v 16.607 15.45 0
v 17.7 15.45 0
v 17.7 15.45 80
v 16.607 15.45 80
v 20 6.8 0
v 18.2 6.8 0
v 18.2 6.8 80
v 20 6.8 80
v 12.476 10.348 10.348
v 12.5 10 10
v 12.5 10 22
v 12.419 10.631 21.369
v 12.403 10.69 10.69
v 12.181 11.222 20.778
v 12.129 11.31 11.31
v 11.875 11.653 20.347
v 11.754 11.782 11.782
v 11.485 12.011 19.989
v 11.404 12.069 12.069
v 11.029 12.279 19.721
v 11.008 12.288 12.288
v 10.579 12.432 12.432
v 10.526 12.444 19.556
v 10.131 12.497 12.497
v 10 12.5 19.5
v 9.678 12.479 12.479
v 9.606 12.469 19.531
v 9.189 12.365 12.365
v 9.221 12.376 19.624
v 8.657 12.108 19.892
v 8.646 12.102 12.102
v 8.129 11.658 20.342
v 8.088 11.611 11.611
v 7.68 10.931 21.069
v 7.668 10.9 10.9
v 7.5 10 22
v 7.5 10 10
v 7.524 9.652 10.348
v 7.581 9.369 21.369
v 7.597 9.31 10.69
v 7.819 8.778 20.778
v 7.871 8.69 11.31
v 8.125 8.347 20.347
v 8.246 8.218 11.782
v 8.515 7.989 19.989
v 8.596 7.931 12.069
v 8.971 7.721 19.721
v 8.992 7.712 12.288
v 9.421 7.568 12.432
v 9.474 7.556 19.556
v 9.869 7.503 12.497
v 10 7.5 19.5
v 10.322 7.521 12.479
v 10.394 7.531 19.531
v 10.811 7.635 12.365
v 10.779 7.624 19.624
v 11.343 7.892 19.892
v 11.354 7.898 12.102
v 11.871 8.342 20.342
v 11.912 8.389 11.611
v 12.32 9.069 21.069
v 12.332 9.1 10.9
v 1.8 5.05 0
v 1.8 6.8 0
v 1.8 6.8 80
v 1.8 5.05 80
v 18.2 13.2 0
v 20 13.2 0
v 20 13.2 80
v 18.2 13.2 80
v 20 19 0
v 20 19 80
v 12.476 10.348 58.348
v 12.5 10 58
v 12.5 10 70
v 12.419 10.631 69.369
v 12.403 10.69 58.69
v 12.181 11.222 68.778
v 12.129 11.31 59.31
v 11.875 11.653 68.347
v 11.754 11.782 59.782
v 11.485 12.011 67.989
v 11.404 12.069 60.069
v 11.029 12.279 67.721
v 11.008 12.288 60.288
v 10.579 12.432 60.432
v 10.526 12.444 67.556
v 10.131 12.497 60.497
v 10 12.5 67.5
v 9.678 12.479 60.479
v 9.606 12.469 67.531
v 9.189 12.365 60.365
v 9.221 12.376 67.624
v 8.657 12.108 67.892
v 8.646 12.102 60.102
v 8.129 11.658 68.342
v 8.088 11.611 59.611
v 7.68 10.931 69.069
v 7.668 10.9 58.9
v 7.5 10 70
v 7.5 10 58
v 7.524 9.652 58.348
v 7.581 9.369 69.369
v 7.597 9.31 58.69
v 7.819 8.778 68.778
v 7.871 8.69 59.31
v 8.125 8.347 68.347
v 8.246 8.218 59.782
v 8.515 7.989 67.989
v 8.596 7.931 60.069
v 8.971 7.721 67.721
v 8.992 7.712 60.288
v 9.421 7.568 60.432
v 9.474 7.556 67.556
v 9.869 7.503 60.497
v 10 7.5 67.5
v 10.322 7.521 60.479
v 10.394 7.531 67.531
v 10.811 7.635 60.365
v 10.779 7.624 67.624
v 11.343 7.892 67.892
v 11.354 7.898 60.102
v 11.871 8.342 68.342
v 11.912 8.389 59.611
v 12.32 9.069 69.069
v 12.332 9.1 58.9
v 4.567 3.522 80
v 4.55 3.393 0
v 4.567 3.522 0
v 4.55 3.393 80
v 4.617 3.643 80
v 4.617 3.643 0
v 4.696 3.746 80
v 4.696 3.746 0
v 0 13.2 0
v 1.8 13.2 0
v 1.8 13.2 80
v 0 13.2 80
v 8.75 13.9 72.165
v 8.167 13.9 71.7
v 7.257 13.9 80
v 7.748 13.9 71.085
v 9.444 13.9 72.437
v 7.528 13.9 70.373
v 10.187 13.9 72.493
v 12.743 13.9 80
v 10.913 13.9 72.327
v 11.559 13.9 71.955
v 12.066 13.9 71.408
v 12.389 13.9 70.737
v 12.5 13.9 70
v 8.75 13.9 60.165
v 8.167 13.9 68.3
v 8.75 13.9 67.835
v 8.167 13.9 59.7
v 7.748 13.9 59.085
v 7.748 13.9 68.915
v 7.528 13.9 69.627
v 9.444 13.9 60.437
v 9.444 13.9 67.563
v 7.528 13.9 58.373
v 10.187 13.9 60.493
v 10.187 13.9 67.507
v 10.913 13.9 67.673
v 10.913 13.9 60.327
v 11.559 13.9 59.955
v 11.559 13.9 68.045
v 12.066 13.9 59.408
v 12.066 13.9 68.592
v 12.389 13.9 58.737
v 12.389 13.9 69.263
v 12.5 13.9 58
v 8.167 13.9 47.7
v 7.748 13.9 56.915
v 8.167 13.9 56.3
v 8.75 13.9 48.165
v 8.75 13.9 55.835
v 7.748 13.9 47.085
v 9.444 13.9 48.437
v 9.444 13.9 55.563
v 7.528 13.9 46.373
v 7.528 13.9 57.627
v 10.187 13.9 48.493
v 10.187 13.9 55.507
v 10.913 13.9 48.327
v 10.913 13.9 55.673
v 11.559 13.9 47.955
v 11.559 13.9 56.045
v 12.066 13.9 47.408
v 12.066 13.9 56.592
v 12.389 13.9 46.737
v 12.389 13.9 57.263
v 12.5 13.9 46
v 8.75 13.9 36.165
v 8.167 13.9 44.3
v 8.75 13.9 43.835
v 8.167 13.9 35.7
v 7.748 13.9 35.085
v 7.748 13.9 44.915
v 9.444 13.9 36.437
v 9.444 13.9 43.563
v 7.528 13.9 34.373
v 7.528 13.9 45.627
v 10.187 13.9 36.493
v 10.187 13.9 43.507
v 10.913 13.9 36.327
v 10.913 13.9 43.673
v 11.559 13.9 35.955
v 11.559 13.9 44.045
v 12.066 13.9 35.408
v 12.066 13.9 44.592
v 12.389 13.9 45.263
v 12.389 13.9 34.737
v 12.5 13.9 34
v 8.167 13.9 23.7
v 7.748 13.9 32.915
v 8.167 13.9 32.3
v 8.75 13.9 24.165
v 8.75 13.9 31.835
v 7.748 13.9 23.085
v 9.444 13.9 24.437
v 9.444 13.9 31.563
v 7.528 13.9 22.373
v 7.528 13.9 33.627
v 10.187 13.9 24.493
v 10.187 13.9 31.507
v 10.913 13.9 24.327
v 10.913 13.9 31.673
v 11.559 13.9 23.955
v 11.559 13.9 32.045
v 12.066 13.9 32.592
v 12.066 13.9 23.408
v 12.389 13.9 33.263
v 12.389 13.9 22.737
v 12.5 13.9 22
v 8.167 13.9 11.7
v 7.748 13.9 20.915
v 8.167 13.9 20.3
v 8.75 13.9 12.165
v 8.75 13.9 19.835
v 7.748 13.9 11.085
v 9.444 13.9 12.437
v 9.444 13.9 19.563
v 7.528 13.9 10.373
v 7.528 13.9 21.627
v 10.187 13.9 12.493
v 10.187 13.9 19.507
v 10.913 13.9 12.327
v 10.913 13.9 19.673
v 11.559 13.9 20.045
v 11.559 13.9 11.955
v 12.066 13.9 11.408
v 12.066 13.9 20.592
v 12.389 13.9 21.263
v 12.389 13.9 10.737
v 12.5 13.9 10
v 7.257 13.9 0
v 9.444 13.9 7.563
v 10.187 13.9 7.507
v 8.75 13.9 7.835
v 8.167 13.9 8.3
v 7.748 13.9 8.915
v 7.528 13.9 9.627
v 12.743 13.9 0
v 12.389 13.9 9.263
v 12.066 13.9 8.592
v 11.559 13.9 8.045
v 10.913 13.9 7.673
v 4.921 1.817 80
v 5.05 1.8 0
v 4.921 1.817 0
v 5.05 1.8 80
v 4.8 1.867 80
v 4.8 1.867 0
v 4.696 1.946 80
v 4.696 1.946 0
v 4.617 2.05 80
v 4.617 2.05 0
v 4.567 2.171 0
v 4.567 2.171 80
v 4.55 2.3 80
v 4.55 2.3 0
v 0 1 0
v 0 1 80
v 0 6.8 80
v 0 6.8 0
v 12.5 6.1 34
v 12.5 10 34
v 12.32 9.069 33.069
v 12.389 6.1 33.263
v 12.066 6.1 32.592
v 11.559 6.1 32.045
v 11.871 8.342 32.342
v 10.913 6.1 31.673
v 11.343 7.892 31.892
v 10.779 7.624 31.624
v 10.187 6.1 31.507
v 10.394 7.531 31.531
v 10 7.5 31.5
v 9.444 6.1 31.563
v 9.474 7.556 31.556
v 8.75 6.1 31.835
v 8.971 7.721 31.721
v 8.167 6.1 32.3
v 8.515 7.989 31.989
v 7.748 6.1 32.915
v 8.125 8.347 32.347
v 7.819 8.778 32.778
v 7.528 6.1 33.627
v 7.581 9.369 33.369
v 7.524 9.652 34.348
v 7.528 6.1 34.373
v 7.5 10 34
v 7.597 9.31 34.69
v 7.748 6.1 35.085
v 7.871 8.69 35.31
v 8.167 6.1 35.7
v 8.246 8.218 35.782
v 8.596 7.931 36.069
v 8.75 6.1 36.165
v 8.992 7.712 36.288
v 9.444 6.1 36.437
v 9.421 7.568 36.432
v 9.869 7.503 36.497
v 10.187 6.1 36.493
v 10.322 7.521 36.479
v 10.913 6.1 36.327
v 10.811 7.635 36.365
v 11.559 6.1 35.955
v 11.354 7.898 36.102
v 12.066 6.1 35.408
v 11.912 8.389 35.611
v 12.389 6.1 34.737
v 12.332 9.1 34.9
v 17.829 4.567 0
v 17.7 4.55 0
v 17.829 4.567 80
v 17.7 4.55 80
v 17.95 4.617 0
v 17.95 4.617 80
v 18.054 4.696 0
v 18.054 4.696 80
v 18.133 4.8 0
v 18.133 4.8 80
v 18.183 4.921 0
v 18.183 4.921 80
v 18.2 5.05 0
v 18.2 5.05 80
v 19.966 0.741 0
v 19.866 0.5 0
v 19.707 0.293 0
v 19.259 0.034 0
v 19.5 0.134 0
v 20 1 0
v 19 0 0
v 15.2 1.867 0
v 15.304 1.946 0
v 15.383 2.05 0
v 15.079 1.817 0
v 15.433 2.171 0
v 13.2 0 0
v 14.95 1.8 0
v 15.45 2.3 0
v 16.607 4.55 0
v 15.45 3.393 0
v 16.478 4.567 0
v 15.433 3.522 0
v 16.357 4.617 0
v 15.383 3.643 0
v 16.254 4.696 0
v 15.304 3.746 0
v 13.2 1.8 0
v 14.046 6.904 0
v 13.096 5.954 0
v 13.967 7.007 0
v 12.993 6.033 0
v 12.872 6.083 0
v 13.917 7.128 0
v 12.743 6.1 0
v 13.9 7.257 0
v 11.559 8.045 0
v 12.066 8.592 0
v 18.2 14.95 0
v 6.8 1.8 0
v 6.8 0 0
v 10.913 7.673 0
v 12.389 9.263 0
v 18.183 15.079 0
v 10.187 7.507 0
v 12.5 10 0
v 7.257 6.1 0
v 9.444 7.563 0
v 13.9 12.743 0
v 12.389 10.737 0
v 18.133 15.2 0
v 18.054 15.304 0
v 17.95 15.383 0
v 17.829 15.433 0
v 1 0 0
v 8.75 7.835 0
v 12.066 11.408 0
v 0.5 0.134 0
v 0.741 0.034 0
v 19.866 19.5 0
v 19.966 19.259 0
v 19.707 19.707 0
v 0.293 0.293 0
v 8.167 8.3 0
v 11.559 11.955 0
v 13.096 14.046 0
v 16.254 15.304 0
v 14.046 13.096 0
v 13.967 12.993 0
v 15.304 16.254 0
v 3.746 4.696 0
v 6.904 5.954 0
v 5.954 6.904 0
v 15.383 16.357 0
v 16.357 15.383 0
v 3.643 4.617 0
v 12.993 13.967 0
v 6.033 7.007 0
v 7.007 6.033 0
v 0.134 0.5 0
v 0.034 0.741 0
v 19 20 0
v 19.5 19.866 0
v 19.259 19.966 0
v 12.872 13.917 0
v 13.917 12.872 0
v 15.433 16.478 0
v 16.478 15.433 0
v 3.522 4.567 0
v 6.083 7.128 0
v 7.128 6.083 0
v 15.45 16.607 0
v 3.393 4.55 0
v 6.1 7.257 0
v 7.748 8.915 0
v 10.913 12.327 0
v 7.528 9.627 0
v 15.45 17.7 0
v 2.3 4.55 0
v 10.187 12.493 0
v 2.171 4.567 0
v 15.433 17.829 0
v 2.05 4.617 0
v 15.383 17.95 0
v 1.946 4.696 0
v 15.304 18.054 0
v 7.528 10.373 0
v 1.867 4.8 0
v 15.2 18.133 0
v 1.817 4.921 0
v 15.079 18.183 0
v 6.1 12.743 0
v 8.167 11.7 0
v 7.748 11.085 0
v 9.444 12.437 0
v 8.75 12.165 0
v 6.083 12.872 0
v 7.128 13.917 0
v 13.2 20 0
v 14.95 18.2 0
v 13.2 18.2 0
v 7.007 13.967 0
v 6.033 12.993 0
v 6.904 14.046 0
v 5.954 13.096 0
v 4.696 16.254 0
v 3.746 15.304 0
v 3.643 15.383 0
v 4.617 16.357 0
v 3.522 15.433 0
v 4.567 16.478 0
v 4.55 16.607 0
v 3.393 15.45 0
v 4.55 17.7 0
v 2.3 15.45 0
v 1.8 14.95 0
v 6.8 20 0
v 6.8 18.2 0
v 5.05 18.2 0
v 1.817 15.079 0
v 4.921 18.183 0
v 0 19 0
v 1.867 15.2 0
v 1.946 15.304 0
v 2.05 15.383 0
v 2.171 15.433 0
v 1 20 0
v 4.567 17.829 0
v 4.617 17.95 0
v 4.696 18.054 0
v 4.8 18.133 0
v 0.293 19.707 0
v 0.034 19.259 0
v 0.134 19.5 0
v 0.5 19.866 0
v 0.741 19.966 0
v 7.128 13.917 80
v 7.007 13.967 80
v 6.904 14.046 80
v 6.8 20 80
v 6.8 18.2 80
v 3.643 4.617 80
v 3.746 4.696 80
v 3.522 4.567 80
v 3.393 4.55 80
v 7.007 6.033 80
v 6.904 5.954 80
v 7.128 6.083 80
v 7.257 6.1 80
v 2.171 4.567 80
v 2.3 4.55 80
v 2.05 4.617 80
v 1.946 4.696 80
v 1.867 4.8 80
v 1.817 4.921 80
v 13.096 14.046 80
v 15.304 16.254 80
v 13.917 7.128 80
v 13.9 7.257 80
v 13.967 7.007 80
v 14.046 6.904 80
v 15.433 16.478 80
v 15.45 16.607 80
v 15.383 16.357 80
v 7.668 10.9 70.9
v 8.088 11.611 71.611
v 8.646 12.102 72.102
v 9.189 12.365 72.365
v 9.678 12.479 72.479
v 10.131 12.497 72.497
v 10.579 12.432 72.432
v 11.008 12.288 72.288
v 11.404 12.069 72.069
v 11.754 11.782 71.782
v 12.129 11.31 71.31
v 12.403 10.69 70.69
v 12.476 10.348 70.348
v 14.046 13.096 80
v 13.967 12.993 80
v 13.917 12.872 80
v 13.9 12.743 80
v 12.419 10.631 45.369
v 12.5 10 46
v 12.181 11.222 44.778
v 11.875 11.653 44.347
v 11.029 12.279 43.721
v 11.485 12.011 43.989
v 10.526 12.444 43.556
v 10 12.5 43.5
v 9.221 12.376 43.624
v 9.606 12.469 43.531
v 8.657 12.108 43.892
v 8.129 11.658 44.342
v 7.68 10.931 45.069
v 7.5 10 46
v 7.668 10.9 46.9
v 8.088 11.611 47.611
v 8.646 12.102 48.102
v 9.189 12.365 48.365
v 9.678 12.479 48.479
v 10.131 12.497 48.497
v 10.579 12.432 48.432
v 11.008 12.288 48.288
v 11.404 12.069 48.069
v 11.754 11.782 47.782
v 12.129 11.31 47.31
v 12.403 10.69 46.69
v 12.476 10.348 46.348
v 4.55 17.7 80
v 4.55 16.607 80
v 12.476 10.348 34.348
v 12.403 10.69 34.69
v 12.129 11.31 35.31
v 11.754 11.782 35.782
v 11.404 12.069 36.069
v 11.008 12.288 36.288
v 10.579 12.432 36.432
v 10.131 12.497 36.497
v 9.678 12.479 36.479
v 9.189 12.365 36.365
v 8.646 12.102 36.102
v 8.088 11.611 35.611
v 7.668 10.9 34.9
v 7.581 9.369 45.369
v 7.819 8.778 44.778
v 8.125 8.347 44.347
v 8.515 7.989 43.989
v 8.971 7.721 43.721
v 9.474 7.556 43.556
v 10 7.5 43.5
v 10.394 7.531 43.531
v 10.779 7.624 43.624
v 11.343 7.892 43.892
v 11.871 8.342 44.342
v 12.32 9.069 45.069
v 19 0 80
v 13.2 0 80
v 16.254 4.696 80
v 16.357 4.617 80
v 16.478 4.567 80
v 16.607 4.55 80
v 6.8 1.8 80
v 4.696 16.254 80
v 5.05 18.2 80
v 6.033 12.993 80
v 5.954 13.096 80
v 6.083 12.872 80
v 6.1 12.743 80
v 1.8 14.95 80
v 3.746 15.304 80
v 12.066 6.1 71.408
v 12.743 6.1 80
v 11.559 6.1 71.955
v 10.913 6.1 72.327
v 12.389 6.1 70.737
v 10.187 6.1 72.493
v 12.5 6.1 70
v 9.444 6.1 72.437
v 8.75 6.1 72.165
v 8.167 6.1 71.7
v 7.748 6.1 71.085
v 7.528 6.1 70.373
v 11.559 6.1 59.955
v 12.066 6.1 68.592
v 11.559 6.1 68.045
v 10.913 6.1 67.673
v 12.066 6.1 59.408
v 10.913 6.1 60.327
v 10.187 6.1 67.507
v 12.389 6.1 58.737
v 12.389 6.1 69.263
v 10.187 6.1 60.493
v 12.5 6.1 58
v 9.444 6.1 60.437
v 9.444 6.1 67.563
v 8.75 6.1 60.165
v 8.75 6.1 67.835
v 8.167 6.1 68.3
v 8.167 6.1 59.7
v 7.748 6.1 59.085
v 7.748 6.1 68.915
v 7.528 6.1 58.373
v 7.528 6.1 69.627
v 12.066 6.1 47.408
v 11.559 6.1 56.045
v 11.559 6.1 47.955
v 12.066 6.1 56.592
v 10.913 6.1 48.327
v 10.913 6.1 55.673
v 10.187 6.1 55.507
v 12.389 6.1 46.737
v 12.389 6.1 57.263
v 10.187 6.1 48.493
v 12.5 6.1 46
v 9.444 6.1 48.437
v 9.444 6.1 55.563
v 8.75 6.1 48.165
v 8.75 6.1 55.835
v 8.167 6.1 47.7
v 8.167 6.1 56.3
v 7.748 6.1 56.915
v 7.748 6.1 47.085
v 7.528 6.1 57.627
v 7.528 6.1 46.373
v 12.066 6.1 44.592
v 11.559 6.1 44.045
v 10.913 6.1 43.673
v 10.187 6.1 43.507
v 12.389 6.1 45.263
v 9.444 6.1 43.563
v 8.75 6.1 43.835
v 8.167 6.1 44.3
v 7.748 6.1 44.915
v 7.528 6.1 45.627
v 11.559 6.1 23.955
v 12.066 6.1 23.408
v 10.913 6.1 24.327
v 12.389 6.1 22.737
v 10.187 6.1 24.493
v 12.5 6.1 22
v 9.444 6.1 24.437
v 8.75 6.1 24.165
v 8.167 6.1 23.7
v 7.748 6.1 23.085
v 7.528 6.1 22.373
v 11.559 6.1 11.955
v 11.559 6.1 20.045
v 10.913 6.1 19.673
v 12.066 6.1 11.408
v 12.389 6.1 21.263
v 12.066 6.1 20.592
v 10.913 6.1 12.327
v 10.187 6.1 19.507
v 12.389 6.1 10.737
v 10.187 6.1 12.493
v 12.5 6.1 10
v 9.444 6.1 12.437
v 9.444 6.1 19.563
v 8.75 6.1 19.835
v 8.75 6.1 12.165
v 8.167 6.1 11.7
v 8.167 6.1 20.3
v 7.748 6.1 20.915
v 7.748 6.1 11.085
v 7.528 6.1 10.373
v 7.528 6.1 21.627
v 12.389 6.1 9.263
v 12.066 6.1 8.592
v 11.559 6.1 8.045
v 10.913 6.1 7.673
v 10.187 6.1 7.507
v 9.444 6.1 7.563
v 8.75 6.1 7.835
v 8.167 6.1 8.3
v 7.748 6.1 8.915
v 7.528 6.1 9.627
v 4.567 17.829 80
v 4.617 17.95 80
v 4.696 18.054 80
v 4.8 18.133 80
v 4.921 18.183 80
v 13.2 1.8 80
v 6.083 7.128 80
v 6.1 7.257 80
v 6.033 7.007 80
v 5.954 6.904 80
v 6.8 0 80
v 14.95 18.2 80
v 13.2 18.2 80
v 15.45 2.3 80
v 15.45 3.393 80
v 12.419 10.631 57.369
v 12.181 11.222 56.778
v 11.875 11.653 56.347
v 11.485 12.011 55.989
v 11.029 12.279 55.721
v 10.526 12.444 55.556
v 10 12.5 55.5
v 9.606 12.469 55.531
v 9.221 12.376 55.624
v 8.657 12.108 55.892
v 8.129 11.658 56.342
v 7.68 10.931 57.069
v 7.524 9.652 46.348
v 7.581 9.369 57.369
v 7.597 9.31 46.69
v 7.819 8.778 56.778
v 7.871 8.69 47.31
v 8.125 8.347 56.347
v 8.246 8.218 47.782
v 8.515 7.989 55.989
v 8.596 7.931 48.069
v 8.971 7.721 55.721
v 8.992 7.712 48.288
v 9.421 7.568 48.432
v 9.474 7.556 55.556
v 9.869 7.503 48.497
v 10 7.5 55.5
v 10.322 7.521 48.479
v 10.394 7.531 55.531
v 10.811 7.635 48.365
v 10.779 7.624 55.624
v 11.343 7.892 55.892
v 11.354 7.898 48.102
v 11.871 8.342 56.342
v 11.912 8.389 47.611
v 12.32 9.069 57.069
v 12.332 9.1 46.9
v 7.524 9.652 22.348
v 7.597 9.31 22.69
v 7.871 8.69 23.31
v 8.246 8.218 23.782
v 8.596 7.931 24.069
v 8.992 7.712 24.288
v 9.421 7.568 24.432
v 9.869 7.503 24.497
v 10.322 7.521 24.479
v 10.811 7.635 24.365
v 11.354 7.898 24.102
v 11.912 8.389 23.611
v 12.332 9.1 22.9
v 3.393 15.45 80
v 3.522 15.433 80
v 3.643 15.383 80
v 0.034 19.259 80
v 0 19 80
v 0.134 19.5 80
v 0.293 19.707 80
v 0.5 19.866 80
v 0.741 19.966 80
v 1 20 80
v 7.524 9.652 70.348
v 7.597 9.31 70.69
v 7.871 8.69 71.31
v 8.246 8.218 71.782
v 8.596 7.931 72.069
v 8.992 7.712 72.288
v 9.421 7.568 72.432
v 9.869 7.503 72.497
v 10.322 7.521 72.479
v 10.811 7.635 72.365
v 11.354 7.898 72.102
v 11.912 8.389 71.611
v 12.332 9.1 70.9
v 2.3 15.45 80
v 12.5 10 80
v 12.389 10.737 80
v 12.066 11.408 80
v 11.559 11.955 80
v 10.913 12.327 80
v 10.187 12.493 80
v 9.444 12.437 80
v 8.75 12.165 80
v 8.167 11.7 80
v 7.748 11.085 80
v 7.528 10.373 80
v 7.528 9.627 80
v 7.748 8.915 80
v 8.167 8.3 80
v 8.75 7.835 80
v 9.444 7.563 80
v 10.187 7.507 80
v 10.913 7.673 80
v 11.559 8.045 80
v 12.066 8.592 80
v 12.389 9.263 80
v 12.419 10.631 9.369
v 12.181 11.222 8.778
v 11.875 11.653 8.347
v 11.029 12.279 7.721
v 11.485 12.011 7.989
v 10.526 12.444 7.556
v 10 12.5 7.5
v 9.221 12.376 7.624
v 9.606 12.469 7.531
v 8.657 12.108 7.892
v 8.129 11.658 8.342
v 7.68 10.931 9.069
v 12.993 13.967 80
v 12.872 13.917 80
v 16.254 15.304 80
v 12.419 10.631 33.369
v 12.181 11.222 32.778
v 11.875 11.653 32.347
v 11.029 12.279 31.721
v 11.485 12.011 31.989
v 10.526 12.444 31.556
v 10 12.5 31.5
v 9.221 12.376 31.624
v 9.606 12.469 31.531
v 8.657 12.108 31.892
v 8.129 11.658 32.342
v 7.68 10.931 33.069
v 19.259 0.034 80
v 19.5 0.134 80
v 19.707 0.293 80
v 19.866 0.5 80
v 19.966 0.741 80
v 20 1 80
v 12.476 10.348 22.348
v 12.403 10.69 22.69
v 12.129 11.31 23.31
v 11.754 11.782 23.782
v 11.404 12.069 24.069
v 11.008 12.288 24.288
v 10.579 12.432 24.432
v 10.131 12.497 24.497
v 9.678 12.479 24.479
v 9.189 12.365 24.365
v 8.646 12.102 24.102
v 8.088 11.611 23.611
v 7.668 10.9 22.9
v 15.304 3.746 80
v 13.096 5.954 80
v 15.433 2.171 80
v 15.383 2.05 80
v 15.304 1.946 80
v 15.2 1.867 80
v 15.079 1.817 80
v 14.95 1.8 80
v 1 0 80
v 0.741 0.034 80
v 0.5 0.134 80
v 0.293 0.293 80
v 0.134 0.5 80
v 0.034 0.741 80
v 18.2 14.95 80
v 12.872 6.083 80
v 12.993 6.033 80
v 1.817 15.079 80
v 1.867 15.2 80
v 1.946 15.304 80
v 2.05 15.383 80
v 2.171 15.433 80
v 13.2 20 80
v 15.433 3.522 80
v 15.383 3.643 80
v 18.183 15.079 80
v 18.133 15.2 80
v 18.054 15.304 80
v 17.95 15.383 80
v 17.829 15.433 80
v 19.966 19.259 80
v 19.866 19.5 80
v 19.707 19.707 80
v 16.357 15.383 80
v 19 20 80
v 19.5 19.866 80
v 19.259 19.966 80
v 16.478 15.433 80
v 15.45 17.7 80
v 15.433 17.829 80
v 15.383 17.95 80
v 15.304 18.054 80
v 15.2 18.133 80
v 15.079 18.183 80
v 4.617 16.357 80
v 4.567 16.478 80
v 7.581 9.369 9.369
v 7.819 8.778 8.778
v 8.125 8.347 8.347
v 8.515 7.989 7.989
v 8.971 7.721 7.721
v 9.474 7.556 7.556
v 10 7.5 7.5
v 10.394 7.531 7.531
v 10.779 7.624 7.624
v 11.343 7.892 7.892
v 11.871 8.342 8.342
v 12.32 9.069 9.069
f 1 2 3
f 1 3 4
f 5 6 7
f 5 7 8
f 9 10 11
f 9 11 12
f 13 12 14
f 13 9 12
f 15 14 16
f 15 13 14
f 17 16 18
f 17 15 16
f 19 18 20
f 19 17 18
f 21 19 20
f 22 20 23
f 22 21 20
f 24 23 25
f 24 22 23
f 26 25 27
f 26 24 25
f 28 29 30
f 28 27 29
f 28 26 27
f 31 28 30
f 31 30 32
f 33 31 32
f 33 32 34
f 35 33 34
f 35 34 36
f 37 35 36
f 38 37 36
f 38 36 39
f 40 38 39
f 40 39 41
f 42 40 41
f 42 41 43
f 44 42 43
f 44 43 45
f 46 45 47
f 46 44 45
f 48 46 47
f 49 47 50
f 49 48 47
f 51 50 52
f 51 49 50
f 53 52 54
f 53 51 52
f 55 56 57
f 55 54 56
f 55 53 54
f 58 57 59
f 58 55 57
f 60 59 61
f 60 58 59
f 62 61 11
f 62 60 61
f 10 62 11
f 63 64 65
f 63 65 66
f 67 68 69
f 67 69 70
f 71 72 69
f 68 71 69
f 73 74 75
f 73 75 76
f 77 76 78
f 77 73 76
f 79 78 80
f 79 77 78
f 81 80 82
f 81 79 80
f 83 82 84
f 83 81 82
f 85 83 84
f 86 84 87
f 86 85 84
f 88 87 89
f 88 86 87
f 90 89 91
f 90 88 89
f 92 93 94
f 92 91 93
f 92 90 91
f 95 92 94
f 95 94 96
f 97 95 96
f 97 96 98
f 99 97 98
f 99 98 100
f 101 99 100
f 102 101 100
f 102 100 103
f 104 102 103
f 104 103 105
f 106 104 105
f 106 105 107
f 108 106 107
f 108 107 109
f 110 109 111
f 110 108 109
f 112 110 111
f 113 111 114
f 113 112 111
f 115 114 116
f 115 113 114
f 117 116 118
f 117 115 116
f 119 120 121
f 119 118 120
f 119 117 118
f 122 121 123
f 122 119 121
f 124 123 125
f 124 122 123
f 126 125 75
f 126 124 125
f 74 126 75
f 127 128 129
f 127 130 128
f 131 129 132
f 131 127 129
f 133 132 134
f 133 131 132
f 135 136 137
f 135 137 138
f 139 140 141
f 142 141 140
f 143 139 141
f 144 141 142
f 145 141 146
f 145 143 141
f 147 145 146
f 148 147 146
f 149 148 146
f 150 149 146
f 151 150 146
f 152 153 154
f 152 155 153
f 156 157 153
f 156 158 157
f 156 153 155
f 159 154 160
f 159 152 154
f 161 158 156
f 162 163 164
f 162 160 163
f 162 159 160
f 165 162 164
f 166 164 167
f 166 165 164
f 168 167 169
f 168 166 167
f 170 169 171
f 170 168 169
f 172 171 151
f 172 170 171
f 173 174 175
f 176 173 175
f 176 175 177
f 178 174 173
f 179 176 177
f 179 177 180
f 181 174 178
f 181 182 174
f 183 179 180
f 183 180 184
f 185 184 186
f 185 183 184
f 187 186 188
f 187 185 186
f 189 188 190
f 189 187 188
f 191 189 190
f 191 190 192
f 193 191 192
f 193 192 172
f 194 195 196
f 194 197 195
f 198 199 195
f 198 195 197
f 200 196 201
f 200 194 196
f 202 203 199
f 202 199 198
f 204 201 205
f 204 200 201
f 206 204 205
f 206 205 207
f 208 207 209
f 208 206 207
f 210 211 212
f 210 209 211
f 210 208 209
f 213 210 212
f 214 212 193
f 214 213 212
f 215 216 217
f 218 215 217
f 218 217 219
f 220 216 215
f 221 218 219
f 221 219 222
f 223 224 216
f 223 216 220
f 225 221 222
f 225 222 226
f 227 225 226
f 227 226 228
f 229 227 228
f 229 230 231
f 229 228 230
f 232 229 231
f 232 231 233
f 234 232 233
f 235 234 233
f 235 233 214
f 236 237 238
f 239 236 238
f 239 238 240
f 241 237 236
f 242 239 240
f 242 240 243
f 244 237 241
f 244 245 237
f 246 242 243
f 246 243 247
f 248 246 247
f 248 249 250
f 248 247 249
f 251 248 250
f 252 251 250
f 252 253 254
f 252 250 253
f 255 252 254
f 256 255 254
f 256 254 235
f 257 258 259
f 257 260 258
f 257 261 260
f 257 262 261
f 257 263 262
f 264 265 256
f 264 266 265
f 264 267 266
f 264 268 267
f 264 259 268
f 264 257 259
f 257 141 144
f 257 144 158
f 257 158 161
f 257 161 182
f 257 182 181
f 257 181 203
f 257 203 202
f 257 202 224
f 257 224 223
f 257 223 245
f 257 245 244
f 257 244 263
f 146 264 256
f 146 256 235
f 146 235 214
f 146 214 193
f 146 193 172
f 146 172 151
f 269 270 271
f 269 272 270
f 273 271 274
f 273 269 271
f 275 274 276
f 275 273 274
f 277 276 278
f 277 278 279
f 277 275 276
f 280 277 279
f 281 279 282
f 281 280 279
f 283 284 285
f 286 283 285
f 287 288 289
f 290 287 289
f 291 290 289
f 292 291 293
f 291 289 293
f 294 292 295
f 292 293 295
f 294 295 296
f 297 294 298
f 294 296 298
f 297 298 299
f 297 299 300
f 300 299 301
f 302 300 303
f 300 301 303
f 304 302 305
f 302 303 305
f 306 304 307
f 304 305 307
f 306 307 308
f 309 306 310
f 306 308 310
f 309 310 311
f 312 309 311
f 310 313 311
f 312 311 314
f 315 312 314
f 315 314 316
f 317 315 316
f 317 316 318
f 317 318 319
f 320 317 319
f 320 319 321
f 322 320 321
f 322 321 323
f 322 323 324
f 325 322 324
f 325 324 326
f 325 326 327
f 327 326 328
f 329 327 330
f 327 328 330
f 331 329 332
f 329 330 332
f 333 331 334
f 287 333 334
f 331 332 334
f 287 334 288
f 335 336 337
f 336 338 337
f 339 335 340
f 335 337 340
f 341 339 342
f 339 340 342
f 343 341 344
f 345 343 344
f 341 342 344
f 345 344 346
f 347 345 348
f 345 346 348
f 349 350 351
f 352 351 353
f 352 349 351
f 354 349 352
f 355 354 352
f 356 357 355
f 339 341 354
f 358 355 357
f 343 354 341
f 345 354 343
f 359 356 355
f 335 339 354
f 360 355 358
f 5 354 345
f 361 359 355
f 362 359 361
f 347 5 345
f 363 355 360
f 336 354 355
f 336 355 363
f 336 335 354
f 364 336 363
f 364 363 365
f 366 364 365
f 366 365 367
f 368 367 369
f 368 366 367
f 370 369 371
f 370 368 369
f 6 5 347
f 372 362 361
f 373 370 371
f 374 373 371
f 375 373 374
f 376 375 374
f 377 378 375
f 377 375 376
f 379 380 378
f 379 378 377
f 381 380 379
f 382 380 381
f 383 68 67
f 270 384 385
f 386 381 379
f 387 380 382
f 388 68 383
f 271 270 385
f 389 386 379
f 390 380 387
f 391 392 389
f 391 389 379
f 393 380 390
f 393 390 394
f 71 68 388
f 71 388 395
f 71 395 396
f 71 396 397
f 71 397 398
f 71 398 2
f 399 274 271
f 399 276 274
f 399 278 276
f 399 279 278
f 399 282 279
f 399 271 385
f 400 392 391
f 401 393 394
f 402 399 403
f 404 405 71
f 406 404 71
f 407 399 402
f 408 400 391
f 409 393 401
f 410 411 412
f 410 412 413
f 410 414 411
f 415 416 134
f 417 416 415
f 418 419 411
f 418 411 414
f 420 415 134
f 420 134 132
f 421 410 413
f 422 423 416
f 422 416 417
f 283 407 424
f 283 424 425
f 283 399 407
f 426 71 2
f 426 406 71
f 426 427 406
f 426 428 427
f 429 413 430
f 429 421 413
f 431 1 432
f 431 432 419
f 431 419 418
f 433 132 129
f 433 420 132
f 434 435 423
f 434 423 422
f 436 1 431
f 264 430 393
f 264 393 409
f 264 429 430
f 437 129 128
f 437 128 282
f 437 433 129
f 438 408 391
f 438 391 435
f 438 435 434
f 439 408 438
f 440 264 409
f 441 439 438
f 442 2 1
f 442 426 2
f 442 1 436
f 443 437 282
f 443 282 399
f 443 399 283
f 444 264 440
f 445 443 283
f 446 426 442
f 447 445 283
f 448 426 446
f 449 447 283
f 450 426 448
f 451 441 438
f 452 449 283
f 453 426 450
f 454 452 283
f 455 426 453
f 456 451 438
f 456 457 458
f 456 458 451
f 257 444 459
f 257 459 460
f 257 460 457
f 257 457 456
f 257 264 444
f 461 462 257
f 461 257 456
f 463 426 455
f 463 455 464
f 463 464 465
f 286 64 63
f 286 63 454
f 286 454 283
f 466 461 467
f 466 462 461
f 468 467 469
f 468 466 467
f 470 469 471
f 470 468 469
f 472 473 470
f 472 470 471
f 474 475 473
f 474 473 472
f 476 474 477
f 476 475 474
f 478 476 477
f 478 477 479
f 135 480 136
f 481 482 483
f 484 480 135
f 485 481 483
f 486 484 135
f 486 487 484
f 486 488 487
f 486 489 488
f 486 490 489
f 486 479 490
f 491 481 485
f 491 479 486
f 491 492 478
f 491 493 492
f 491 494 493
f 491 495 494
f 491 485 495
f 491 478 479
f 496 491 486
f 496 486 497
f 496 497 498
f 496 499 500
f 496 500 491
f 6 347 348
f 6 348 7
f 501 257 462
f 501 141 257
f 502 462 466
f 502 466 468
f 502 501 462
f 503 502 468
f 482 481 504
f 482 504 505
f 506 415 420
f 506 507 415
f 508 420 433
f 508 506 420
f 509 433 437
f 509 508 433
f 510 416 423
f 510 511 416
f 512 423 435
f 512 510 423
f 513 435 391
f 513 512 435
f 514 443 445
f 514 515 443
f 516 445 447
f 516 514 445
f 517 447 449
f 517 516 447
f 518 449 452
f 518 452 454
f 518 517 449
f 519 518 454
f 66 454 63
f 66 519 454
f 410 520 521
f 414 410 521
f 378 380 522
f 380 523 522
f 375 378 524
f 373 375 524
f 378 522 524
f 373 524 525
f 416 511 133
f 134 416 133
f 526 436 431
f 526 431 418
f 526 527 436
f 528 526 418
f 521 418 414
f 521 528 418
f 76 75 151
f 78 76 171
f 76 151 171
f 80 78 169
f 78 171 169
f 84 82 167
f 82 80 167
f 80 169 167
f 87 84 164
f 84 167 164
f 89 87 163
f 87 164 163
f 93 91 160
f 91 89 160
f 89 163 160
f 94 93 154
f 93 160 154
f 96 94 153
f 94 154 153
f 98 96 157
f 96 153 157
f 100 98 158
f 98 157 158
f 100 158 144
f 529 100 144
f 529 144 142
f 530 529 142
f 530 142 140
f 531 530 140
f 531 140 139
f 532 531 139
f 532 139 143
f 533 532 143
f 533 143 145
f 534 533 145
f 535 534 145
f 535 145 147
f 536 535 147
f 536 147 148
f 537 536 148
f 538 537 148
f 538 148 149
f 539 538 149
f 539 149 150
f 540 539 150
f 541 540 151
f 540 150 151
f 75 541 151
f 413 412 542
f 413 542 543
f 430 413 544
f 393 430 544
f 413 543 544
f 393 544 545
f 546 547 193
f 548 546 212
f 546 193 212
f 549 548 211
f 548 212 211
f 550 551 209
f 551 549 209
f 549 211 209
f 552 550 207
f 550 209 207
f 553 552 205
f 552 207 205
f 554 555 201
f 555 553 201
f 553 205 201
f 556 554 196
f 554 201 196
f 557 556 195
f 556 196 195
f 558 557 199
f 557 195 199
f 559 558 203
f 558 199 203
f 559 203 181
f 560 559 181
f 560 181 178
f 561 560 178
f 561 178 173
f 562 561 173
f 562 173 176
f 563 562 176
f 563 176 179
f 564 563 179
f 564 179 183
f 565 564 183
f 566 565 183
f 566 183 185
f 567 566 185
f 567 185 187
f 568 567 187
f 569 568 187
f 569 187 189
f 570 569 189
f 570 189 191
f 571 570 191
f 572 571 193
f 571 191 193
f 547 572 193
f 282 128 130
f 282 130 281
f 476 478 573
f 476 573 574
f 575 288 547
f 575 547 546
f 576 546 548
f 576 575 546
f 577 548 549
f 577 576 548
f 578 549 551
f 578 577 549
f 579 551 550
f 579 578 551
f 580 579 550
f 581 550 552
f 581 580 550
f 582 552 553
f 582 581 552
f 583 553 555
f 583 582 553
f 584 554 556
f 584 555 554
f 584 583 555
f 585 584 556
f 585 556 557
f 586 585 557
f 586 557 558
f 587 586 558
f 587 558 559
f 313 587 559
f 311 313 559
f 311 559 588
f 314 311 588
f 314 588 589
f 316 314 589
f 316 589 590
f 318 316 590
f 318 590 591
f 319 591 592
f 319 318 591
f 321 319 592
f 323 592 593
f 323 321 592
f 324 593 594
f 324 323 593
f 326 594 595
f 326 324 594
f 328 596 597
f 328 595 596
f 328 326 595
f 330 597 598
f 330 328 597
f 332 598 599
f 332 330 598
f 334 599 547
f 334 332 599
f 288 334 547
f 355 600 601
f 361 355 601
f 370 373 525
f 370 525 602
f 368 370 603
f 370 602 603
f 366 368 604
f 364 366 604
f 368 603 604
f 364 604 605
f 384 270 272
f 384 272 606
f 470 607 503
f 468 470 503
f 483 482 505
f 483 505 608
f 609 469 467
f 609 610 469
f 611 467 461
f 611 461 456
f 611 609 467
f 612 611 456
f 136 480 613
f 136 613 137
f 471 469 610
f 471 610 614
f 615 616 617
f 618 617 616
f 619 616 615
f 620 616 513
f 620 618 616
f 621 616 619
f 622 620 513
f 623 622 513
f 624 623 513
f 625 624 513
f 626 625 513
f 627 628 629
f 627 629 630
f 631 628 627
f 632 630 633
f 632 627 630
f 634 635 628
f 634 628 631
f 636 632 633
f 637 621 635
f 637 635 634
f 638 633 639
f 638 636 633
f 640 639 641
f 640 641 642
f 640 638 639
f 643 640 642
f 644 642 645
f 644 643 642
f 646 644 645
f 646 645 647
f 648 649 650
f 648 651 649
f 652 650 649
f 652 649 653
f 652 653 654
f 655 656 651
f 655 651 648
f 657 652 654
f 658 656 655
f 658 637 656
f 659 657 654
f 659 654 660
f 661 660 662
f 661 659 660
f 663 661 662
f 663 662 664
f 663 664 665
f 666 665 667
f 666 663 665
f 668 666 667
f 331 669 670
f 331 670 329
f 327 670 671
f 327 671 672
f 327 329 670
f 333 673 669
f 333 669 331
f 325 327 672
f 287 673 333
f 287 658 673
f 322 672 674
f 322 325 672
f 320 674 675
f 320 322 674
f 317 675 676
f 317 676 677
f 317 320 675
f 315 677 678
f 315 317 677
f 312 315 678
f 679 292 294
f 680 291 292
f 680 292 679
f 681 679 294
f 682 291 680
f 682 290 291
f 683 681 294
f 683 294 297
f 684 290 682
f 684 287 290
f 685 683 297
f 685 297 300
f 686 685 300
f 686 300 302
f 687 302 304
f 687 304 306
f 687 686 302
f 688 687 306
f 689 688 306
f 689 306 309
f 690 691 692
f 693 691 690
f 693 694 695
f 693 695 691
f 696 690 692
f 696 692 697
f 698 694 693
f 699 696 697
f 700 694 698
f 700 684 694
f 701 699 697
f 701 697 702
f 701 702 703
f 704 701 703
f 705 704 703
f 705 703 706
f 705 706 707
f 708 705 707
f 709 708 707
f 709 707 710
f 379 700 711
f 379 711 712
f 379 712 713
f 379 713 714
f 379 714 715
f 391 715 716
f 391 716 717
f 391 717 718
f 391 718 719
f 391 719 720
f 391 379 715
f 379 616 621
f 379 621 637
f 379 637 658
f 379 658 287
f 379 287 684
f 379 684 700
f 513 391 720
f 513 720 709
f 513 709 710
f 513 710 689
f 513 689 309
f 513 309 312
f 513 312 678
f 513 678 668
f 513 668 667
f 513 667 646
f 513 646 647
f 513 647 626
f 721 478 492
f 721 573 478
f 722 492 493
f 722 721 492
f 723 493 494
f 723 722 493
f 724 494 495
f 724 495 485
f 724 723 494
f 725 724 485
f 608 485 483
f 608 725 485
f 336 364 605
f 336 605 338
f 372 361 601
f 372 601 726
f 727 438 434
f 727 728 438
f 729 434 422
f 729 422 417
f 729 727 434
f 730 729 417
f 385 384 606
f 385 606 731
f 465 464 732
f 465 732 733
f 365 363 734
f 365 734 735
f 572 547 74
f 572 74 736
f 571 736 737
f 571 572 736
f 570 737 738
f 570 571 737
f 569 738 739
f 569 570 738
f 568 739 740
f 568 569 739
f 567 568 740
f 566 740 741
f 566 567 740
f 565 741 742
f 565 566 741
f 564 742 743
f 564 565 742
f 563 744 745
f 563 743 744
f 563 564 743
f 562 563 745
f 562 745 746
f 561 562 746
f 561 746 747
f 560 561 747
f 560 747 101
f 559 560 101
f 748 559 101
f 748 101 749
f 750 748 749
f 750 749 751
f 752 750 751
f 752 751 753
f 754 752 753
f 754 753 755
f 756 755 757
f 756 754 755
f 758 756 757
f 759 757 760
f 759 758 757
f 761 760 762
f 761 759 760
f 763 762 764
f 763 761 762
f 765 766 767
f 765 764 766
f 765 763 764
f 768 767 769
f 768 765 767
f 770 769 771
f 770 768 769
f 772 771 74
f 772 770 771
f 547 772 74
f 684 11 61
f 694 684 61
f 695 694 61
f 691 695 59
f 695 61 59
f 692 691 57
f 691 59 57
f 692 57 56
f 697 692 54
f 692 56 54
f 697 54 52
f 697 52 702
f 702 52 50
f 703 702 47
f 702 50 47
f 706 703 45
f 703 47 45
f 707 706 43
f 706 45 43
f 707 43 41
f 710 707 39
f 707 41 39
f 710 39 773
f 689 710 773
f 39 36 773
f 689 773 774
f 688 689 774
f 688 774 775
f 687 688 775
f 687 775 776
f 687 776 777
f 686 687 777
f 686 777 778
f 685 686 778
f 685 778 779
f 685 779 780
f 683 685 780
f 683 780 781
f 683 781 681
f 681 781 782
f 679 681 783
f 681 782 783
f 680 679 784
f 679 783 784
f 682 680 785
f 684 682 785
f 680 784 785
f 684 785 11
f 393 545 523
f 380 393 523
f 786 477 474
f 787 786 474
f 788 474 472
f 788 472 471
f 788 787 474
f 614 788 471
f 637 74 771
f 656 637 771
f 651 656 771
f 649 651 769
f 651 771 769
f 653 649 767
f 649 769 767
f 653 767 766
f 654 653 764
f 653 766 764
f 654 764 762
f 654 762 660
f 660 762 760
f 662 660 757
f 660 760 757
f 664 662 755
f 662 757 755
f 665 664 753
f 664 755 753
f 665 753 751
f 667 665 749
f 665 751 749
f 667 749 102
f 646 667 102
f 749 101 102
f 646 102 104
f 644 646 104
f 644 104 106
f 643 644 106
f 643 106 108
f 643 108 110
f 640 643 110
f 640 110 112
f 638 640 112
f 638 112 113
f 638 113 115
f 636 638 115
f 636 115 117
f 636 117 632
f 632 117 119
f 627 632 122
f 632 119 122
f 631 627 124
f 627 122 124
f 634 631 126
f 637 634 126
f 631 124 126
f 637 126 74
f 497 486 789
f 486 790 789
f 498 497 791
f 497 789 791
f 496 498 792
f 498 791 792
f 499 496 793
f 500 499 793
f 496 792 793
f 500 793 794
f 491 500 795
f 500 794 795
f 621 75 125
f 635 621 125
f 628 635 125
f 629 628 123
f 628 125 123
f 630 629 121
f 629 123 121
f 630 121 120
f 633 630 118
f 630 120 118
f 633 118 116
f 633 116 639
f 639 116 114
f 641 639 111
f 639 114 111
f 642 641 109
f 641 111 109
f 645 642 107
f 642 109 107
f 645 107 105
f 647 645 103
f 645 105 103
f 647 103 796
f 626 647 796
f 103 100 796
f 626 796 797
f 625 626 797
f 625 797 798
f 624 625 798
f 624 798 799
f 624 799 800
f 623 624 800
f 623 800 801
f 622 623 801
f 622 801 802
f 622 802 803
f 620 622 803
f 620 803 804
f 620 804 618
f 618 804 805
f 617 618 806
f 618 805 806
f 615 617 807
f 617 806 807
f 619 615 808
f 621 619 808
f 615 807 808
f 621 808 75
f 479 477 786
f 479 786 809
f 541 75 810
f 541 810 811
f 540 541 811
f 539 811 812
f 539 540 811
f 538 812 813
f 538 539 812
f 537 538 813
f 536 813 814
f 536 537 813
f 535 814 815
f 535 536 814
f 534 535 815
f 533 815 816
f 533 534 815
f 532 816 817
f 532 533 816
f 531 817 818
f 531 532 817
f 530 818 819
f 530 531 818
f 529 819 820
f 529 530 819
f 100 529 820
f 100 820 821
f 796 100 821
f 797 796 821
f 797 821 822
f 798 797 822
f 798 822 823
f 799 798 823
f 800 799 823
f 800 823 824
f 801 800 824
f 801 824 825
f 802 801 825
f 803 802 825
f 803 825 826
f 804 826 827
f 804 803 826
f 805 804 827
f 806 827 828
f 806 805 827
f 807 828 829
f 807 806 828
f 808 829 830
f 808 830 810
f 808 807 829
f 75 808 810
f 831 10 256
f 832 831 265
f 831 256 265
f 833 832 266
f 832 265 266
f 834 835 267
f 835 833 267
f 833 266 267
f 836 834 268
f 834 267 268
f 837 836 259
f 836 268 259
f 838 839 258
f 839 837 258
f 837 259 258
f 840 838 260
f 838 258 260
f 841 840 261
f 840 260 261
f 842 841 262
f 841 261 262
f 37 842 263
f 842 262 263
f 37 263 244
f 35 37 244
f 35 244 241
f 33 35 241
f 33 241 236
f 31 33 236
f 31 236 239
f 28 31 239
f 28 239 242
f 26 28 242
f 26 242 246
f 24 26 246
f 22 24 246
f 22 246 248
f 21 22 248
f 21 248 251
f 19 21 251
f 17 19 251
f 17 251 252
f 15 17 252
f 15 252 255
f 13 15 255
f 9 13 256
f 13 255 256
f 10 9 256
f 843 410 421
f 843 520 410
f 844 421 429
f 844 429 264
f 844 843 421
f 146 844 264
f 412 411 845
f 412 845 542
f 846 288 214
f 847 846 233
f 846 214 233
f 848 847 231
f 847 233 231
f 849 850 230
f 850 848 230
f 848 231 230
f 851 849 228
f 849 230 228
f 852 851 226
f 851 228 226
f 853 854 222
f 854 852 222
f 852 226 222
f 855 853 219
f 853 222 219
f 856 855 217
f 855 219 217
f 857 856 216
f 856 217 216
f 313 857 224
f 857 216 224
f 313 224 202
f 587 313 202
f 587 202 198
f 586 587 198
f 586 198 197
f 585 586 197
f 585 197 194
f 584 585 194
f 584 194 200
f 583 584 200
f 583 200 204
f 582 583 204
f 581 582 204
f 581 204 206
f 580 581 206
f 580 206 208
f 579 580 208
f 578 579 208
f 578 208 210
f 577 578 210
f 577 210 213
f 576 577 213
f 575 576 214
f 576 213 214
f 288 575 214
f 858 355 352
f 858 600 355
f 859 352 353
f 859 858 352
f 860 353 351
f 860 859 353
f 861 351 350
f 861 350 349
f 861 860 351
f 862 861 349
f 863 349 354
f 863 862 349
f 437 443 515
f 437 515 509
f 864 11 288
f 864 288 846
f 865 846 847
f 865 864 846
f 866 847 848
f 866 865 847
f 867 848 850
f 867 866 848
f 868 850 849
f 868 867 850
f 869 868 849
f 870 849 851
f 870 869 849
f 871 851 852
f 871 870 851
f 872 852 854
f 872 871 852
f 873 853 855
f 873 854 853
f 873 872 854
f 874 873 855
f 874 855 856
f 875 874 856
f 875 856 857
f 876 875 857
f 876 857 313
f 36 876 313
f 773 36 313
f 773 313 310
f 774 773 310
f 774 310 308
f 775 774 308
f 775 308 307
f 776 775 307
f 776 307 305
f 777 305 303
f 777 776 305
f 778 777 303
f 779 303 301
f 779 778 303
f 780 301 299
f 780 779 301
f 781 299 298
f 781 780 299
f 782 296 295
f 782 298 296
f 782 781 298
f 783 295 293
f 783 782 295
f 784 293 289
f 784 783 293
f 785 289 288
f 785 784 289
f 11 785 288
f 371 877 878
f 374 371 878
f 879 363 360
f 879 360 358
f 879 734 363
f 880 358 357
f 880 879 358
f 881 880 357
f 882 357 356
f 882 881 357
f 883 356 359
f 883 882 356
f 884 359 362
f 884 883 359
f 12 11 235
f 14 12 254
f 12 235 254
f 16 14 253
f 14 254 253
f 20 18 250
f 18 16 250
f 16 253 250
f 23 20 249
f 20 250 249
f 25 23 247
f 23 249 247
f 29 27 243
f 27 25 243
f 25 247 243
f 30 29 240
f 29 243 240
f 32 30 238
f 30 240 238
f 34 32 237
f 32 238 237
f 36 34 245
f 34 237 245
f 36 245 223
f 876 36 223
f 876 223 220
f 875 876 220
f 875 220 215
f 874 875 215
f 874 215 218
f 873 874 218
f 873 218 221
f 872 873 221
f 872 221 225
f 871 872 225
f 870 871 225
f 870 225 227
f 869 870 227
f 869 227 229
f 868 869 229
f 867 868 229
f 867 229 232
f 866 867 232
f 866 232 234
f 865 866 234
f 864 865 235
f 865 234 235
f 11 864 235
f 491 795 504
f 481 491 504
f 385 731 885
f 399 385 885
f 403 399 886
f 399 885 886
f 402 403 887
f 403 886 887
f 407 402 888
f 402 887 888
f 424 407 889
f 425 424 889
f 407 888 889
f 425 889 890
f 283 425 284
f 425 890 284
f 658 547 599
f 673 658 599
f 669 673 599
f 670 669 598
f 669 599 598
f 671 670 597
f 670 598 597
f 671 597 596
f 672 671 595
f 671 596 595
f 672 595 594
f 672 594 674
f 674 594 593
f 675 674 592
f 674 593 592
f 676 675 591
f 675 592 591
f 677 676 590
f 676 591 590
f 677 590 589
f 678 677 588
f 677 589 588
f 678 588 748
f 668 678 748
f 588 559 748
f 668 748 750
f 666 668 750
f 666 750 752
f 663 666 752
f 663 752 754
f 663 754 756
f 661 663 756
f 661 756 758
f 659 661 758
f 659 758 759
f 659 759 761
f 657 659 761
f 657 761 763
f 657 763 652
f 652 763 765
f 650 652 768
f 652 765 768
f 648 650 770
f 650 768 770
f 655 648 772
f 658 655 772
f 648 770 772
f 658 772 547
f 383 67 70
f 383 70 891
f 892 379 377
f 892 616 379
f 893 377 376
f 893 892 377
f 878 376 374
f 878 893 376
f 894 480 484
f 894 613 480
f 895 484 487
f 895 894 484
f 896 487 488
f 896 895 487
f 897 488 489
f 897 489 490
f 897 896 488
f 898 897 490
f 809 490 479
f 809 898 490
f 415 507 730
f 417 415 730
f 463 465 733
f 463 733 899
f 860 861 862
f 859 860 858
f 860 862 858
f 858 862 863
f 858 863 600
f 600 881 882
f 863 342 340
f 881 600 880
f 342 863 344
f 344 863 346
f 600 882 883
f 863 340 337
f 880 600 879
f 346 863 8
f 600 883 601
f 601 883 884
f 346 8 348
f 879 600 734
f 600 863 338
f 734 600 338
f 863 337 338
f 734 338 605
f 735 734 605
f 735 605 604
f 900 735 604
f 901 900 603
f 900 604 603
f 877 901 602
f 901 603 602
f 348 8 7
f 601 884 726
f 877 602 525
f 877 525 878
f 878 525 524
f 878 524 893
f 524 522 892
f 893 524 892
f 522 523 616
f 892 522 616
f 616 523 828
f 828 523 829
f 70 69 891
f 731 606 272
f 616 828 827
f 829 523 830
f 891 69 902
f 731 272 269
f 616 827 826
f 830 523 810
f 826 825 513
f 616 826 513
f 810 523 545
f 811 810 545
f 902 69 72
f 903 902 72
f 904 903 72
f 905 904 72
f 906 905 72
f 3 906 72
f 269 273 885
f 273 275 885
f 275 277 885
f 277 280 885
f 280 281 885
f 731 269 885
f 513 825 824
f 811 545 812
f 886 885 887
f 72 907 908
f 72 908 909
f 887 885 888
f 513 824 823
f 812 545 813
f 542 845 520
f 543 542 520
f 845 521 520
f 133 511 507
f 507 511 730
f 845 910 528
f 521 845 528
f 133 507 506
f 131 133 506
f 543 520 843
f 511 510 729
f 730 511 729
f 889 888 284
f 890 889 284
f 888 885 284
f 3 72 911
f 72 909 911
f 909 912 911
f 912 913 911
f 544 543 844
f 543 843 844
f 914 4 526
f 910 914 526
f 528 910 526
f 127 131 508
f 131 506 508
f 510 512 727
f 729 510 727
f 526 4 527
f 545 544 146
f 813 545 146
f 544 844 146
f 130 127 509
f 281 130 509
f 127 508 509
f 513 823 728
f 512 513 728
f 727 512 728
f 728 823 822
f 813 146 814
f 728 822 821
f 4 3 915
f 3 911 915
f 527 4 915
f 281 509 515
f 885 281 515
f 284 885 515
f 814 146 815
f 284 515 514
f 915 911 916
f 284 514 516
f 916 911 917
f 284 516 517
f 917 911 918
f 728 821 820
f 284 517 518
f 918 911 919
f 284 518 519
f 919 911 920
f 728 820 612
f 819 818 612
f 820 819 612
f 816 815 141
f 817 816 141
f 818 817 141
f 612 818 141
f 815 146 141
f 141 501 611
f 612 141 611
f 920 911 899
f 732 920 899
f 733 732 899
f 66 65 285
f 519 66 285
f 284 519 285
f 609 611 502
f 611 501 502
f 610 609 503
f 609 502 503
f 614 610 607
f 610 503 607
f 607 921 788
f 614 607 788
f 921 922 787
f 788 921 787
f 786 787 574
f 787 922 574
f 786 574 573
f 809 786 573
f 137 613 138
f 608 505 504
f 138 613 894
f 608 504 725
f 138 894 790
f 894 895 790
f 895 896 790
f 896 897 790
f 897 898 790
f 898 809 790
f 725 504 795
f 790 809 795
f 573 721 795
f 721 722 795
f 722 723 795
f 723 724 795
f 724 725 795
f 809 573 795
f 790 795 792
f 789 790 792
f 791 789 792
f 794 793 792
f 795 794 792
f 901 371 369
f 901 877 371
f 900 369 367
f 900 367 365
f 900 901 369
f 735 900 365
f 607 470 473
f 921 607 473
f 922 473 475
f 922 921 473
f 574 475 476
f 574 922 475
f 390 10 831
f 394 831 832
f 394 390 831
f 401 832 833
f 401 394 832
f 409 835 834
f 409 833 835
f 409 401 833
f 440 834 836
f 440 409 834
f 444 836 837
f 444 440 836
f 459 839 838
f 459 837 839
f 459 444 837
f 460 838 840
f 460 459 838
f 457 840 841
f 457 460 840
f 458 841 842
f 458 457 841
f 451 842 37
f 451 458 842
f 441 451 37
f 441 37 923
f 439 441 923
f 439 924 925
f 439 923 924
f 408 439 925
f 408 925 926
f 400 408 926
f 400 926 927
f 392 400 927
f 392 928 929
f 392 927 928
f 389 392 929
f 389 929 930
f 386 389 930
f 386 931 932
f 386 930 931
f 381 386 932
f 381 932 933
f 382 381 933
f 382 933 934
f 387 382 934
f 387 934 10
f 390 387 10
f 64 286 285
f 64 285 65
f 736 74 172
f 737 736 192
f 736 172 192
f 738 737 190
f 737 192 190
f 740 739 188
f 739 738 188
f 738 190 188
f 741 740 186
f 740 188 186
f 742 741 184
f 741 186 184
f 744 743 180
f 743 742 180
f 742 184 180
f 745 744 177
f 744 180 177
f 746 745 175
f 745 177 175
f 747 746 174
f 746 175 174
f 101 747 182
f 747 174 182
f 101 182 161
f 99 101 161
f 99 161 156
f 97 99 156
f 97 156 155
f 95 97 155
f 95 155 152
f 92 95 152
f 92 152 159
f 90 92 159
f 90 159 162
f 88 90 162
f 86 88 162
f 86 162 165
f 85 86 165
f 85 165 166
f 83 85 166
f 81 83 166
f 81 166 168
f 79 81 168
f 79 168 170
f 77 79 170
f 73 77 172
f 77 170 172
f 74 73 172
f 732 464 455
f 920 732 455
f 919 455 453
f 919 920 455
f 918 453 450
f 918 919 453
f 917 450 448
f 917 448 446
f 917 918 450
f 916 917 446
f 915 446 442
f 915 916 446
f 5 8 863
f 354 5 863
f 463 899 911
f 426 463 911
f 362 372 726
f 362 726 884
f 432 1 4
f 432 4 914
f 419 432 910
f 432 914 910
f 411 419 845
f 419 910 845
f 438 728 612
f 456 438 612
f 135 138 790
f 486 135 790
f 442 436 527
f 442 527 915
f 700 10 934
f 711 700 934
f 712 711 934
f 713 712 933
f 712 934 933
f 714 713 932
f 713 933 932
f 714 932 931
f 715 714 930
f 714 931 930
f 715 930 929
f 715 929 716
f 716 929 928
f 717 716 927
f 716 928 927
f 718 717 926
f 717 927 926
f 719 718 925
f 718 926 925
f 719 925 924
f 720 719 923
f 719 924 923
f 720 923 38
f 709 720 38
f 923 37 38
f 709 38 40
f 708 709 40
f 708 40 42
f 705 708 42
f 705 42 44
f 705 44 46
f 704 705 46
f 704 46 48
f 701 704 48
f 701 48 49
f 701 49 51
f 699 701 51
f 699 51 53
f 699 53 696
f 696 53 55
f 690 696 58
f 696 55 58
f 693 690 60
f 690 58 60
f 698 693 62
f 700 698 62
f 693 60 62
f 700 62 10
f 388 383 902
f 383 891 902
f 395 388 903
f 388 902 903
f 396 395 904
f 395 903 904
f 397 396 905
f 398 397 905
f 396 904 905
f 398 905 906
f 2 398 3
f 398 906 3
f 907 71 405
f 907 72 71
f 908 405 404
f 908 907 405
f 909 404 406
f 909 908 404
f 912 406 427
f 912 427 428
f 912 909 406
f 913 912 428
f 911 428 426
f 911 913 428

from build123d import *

# Parameters (mm, degrees)
SKETCH1_R           = 2.5
BOSS_EXTRUDE1_DEPTH = 80
FILLET1_R           = 1
FILLET2_R           = 0.5
FILLET3_R           = 0.5
FILLET4_R           = 0.5
FILLET5_R           = 0.5
SKETCH2_R           = 2.5
CUT_EXTRUDE1_DEPTH  = 8


with BuildPart() as part:
    # Sketch1 → Boss-Extrude1 (new body)
    with BuildSketch(Plane.XY):
        Polygon((13.2, 0), (13.2, 1.8), (15.45, 1.8), (15.45, 3.6), (12.95, 6.1), (7.05, 6.1), (4.55, 3.6), (4.55, 1.8), (6.8, 1.8), (6.8, 0), (0, 0), (0, 6.8), (1.8, 6.8), (1.8, 4.55), (3.6, 4.55), (6.1, 7.05), (6.1, 12.95), (3.6, 15.45), (1.8, 15.45), (1.8, 13.2), (0, 13.2), (0, 20), (6.8, 20), (6.8, 18.2), (4.55, 18.2), (4.55, 16.4), (7.05, 13.9), (12.95, 13.9), (15.45, 16.4), (15.45, 18.2), (13.2, 18.2), (13.2, 20), (20, 20), (20, 13.2), (18.2, 13.2), (18.2, 15.45), (16.4, 15.45), (13.9, 12.95), (13.9, 7.05), (16.4, 4.55), (18.2, 4.55), (18.2, 6.8), (20, 6.8), (20, 0), align=None)
        with Locations((10, 10)):
            Circle(SKETCH1_R, mode=Mode.SUBTRACT)
    extrude(amount=BOSS_EXTRUDE1_DEPTH)

    # Fillet1
    fillet1_edges = [part.edges().sort_by_distance(p)[0] for p in [
        (0, 0, 40),
        (0, 20, 40),
        (20, 20, 40),
        (20, 0, 40),
    ]]
    fillet(fillet1_edges, radius=FILLET1_R)

    # Fillet2
    fillet2_edges = [part.edges().sort_by_distance(p)[0] for p in [
        (4.55, 18.2, 40),
        (4.55, 16.4, 40),
        (7.05, 13.9, 40),
        (12.95, 13.9, 40),
        (15.45, 16.4, 40),
        (15.45, 18.2, 40),
    ]]
    fillet(fillet2_edges, radius=FILLET2_R)

    # Fillet3
    fillet3_edges = [part.edges().sort_by_distance(p)[0] for p in [
        (18.2, 15.45, 40),
        (16.4, 15.45, 40),
        (13.9, 12.95, 40),
        (13.9, 7.05, 40),
        (16.4, 4.55, 40),
        (18.2, 4.55, 40),
    ]]
    fillet(fillet3_edges, radius=FILLET3_R)

    # Fillet4
    fillet4_edges = [part.edges().sort_by_distance(p)[0] for p in [
        (1.8, 4.55, 40),
        (3.6, 4.55, 40),
        (6.1, 7.05, 40),
        (6.1, 12.95, 40),
        (3.6, 15.45, 40),
        (1.8, 15.45, 40),
    ]]
    fillet(fillet4_edges, radius=FILLET4_R)

    # Fillet5
    fillet5_edges = [part.edges().sort_by_distance(p)[0] for p in [
        (15.45, 1.8, 40),
        (15.45, 3.6, 40),
        (12.95, 6.1, 40),
        (7.05, 6.1, 40),
        (4.55, 3.6, 40),
        (4.55, 1.8, 40),
    ]]
    fillet(fillet5_edges, radius=FILLET5_R)

    # Sketch2 → Cut-Extrude1 (cut)
    with BuildSketch(Plane(origin=(0, 13.9, 0), x_dir=(1, 0, 0), z_dir=(0, 1, 0))):
        with Locations((10, -58)):
            Circle(SKETCH2_R)
        with Locations((10, -70)):
            Circle(SKETCH2_R)
        with Locations((10, -34)):
            Circle(SKETCH2_R)
        with Locations((10, -46)):
            Circle(SKETCH2_R)
        with Locations((10, -22)):
            Circle(SKETCH2_R)
        with Locations((10, -10)):
            Circle(SKETCH2_R)
    extrude(amount=-CUT_EXTRUDE1_DEPTH, mode=Mode.SUBTRACT)


solid = part.part
